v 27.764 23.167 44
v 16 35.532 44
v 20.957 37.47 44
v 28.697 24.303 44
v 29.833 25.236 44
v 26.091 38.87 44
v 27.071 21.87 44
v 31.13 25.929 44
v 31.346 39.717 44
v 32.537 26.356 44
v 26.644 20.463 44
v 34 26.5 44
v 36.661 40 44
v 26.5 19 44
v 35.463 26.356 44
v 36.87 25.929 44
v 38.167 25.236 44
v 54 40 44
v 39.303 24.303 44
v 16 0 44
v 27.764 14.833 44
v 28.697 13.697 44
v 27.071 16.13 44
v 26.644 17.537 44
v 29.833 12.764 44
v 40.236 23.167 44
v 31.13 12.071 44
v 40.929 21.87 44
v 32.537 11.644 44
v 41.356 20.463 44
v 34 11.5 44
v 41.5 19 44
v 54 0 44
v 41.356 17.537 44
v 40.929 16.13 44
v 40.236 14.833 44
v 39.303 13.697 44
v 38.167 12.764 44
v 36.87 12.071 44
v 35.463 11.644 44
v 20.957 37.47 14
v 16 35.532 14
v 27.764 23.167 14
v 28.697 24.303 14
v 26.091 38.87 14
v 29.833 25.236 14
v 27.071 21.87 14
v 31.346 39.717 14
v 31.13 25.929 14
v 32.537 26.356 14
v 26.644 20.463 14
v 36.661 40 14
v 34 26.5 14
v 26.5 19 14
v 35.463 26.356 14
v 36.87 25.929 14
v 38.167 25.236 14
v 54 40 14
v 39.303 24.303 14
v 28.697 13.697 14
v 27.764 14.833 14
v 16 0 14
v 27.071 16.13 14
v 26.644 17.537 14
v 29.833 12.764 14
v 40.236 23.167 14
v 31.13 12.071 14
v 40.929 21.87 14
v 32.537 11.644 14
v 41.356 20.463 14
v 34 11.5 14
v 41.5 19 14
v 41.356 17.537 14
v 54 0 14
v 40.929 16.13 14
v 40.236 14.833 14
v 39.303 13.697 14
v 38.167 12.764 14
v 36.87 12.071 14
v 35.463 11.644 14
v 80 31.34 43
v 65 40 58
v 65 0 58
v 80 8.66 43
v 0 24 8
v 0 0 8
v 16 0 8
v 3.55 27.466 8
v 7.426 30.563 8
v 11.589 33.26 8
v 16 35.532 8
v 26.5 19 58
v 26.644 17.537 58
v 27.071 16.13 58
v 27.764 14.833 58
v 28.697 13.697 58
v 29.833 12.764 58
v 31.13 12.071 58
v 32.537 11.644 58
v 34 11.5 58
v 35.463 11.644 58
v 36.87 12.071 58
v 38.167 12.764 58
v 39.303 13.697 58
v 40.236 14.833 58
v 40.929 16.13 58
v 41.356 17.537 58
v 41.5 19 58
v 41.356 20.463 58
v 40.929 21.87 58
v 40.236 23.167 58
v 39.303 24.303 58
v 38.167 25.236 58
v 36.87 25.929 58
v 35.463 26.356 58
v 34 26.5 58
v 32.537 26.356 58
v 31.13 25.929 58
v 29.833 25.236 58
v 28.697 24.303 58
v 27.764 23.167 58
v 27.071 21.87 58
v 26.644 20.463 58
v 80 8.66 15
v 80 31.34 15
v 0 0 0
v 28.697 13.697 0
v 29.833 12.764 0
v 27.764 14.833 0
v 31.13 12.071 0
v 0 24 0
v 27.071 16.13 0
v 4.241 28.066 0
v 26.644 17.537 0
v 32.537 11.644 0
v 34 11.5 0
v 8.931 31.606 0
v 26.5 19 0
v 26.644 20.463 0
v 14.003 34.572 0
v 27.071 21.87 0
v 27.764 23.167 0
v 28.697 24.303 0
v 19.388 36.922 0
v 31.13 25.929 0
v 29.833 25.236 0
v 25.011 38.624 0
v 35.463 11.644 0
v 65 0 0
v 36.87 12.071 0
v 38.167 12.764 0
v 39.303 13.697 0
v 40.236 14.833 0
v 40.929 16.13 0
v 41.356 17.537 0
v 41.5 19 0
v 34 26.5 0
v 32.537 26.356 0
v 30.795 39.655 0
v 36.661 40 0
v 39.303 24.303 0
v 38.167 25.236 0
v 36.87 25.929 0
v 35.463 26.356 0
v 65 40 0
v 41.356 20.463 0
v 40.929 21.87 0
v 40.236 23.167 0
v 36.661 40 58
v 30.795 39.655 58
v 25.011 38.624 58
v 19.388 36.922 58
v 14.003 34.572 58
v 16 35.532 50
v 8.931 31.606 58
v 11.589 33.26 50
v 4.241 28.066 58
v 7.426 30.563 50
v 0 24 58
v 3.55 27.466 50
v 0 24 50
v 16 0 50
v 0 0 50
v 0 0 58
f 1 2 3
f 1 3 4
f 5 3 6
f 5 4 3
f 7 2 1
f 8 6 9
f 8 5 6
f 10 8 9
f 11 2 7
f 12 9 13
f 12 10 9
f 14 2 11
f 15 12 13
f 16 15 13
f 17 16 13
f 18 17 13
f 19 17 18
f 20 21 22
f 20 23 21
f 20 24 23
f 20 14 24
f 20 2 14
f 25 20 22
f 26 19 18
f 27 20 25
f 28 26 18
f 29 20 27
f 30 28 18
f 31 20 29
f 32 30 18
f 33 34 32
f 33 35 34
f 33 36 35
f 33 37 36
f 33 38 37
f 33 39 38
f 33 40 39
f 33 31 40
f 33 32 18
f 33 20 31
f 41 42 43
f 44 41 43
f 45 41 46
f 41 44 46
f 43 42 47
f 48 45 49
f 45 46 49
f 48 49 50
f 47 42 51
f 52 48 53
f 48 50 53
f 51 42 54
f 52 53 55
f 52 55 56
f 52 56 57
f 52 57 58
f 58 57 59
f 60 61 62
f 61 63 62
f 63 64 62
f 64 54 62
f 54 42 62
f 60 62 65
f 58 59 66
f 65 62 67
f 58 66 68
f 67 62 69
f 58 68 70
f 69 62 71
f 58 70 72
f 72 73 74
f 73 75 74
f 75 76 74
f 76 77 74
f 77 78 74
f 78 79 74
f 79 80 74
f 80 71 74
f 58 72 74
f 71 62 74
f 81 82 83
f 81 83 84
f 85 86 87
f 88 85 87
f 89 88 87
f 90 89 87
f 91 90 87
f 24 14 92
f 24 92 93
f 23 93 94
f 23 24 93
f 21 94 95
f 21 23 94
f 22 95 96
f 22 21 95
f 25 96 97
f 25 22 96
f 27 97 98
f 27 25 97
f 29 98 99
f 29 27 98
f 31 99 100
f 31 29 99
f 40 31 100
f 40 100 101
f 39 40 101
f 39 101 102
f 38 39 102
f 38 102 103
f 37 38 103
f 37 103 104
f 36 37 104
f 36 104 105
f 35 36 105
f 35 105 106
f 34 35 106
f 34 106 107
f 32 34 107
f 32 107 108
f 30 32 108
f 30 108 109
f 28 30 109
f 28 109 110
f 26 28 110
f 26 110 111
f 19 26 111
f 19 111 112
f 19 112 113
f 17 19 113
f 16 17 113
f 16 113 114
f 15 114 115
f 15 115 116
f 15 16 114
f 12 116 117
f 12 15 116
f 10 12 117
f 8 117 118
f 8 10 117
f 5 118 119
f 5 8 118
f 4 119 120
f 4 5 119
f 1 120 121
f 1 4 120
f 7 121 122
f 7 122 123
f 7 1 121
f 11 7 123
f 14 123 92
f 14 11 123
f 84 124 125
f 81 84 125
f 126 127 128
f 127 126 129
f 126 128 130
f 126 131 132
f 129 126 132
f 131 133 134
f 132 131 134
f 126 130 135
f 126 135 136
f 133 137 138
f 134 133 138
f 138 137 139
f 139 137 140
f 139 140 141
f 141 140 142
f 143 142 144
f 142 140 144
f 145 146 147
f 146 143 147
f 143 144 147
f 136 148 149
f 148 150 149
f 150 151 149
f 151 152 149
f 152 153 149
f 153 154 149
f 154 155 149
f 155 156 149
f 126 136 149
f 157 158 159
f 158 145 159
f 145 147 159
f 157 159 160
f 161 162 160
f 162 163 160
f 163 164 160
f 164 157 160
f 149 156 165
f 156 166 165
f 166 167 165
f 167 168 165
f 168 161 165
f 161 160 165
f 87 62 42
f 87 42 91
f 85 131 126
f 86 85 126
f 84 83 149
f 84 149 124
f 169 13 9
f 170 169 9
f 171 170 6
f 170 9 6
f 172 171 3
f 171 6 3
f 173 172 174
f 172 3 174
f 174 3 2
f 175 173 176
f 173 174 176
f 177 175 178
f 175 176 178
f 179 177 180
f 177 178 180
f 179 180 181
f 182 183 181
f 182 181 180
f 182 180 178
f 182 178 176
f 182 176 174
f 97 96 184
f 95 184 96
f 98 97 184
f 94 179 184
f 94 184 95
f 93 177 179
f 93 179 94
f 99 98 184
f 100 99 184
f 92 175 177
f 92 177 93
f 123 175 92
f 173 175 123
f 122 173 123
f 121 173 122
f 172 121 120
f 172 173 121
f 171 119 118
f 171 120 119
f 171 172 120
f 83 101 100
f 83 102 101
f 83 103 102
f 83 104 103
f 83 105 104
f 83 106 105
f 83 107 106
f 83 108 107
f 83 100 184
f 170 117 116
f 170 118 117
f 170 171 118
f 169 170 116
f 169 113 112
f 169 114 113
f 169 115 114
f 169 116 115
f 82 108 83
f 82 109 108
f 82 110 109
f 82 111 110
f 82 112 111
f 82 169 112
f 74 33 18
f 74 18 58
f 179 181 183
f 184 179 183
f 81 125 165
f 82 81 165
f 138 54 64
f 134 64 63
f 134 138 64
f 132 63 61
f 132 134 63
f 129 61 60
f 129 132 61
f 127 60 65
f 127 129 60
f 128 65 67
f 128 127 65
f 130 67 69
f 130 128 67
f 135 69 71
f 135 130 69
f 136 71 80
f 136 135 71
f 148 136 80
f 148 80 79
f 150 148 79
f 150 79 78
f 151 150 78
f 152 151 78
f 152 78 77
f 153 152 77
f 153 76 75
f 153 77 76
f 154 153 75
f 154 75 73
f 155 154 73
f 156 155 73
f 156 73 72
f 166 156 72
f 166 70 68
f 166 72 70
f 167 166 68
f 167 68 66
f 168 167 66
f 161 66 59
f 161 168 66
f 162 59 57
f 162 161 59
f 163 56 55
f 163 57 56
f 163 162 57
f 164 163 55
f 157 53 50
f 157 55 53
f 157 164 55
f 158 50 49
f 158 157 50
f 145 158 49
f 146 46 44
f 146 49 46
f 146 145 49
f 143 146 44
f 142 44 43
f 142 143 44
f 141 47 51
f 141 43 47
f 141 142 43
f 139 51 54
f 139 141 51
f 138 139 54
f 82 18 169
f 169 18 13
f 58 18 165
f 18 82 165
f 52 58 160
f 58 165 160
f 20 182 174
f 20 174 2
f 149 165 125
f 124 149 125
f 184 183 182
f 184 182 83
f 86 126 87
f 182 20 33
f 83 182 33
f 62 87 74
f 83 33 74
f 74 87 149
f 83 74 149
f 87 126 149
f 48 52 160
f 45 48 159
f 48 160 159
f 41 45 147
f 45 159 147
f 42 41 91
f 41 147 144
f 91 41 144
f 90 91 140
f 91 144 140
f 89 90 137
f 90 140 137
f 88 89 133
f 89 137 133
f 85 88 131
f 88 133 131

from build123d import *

# Parameters (mm, degrees)
SKETCH1_R           = 7.5
BOSS_EXTRUDE1_DEPTH = 58
SKETCH2_W           = 16
SKETCH2_H           = 42
CUT_EXTRUDE1_DEPTH  = 107.60206377
SKETCH3_W           = 38
SKETCH3_H           = 30
CUT_EXTRUDE2_DEPTH  = 107.60206377
CUT_EXTRUDE3_DEPTH  = 107.60206377


with BuildPart() as part:
    # Sketch1 → Boss-Extrude1 (new body)
    with BuildSketch(Plane.XY):
        with BuildLine():
            Line((0, 0), (65, 0))
            Line((65, 0), (80, 8.660254038))
            Line((80, 8.660254038), (80, 31.339745962))
            Line((80, 31.339745962), (65, 40))
            Line((65, 40), (36.66060556, 40))
            ThreePointArc((36.66060556, 40), (16.66060556, 35.82575695), (0, 24))
            Line((0, 24), (0, 0))
        make_face()
        with Locations(Location((34, 19, 0), (0, 0, 180))):
            Circle(SKETCH1_R, mode=Mode.SUBTRACT)
    extrude(amount=BOSS_EXTRUDE1_DEPTH)

    # Sketch2 → Cut-Extrude1 (cut, through all)
    with BuildSketch(Plane(origin=(0, 0, 0), x_dir=(1, 0, 0), z_dir=(0, 1, 0))):
        with Locations((8, -29)):
            Rectangle(SKETCH2_W, SKETCH2_H)
    extrude(amount=CUT_EXTRUDE1_DEPTH, mode=Mode.SUBTRACT)

    # Sketch3 → Cut-Extrude2 (cut, through all)
    with BuildSketch(Plane(origin=(0, 0, 0), x_dir=(1, 0, 0), z_dir=(0, 1, 0))):
        with Locations((35, -29)):
            Rectangle(SKETCH3_W, SKETCH3_H)
    extrude(amount=CUT_EXTRUDE2_DEPTH, mode=Mode.SUBTRACT)

    # Sketch4 → Cut-Extrude3 (cut, through all)
    with BuildSketch(Plane(origin=(0, 0, 0), x_dir=(1, 0, 0), z_dir=(0, 1, 0))):
        Polygon((65, 0), (80, -15), (80, 0), align=None)
        Polygon((65, -58), (80, -43), (80, -58), align=None)
    extrude(amount=CUT_EXTRUDE3_DEPTH, mode=Mode.SUBTRACT)


solid = part.part
